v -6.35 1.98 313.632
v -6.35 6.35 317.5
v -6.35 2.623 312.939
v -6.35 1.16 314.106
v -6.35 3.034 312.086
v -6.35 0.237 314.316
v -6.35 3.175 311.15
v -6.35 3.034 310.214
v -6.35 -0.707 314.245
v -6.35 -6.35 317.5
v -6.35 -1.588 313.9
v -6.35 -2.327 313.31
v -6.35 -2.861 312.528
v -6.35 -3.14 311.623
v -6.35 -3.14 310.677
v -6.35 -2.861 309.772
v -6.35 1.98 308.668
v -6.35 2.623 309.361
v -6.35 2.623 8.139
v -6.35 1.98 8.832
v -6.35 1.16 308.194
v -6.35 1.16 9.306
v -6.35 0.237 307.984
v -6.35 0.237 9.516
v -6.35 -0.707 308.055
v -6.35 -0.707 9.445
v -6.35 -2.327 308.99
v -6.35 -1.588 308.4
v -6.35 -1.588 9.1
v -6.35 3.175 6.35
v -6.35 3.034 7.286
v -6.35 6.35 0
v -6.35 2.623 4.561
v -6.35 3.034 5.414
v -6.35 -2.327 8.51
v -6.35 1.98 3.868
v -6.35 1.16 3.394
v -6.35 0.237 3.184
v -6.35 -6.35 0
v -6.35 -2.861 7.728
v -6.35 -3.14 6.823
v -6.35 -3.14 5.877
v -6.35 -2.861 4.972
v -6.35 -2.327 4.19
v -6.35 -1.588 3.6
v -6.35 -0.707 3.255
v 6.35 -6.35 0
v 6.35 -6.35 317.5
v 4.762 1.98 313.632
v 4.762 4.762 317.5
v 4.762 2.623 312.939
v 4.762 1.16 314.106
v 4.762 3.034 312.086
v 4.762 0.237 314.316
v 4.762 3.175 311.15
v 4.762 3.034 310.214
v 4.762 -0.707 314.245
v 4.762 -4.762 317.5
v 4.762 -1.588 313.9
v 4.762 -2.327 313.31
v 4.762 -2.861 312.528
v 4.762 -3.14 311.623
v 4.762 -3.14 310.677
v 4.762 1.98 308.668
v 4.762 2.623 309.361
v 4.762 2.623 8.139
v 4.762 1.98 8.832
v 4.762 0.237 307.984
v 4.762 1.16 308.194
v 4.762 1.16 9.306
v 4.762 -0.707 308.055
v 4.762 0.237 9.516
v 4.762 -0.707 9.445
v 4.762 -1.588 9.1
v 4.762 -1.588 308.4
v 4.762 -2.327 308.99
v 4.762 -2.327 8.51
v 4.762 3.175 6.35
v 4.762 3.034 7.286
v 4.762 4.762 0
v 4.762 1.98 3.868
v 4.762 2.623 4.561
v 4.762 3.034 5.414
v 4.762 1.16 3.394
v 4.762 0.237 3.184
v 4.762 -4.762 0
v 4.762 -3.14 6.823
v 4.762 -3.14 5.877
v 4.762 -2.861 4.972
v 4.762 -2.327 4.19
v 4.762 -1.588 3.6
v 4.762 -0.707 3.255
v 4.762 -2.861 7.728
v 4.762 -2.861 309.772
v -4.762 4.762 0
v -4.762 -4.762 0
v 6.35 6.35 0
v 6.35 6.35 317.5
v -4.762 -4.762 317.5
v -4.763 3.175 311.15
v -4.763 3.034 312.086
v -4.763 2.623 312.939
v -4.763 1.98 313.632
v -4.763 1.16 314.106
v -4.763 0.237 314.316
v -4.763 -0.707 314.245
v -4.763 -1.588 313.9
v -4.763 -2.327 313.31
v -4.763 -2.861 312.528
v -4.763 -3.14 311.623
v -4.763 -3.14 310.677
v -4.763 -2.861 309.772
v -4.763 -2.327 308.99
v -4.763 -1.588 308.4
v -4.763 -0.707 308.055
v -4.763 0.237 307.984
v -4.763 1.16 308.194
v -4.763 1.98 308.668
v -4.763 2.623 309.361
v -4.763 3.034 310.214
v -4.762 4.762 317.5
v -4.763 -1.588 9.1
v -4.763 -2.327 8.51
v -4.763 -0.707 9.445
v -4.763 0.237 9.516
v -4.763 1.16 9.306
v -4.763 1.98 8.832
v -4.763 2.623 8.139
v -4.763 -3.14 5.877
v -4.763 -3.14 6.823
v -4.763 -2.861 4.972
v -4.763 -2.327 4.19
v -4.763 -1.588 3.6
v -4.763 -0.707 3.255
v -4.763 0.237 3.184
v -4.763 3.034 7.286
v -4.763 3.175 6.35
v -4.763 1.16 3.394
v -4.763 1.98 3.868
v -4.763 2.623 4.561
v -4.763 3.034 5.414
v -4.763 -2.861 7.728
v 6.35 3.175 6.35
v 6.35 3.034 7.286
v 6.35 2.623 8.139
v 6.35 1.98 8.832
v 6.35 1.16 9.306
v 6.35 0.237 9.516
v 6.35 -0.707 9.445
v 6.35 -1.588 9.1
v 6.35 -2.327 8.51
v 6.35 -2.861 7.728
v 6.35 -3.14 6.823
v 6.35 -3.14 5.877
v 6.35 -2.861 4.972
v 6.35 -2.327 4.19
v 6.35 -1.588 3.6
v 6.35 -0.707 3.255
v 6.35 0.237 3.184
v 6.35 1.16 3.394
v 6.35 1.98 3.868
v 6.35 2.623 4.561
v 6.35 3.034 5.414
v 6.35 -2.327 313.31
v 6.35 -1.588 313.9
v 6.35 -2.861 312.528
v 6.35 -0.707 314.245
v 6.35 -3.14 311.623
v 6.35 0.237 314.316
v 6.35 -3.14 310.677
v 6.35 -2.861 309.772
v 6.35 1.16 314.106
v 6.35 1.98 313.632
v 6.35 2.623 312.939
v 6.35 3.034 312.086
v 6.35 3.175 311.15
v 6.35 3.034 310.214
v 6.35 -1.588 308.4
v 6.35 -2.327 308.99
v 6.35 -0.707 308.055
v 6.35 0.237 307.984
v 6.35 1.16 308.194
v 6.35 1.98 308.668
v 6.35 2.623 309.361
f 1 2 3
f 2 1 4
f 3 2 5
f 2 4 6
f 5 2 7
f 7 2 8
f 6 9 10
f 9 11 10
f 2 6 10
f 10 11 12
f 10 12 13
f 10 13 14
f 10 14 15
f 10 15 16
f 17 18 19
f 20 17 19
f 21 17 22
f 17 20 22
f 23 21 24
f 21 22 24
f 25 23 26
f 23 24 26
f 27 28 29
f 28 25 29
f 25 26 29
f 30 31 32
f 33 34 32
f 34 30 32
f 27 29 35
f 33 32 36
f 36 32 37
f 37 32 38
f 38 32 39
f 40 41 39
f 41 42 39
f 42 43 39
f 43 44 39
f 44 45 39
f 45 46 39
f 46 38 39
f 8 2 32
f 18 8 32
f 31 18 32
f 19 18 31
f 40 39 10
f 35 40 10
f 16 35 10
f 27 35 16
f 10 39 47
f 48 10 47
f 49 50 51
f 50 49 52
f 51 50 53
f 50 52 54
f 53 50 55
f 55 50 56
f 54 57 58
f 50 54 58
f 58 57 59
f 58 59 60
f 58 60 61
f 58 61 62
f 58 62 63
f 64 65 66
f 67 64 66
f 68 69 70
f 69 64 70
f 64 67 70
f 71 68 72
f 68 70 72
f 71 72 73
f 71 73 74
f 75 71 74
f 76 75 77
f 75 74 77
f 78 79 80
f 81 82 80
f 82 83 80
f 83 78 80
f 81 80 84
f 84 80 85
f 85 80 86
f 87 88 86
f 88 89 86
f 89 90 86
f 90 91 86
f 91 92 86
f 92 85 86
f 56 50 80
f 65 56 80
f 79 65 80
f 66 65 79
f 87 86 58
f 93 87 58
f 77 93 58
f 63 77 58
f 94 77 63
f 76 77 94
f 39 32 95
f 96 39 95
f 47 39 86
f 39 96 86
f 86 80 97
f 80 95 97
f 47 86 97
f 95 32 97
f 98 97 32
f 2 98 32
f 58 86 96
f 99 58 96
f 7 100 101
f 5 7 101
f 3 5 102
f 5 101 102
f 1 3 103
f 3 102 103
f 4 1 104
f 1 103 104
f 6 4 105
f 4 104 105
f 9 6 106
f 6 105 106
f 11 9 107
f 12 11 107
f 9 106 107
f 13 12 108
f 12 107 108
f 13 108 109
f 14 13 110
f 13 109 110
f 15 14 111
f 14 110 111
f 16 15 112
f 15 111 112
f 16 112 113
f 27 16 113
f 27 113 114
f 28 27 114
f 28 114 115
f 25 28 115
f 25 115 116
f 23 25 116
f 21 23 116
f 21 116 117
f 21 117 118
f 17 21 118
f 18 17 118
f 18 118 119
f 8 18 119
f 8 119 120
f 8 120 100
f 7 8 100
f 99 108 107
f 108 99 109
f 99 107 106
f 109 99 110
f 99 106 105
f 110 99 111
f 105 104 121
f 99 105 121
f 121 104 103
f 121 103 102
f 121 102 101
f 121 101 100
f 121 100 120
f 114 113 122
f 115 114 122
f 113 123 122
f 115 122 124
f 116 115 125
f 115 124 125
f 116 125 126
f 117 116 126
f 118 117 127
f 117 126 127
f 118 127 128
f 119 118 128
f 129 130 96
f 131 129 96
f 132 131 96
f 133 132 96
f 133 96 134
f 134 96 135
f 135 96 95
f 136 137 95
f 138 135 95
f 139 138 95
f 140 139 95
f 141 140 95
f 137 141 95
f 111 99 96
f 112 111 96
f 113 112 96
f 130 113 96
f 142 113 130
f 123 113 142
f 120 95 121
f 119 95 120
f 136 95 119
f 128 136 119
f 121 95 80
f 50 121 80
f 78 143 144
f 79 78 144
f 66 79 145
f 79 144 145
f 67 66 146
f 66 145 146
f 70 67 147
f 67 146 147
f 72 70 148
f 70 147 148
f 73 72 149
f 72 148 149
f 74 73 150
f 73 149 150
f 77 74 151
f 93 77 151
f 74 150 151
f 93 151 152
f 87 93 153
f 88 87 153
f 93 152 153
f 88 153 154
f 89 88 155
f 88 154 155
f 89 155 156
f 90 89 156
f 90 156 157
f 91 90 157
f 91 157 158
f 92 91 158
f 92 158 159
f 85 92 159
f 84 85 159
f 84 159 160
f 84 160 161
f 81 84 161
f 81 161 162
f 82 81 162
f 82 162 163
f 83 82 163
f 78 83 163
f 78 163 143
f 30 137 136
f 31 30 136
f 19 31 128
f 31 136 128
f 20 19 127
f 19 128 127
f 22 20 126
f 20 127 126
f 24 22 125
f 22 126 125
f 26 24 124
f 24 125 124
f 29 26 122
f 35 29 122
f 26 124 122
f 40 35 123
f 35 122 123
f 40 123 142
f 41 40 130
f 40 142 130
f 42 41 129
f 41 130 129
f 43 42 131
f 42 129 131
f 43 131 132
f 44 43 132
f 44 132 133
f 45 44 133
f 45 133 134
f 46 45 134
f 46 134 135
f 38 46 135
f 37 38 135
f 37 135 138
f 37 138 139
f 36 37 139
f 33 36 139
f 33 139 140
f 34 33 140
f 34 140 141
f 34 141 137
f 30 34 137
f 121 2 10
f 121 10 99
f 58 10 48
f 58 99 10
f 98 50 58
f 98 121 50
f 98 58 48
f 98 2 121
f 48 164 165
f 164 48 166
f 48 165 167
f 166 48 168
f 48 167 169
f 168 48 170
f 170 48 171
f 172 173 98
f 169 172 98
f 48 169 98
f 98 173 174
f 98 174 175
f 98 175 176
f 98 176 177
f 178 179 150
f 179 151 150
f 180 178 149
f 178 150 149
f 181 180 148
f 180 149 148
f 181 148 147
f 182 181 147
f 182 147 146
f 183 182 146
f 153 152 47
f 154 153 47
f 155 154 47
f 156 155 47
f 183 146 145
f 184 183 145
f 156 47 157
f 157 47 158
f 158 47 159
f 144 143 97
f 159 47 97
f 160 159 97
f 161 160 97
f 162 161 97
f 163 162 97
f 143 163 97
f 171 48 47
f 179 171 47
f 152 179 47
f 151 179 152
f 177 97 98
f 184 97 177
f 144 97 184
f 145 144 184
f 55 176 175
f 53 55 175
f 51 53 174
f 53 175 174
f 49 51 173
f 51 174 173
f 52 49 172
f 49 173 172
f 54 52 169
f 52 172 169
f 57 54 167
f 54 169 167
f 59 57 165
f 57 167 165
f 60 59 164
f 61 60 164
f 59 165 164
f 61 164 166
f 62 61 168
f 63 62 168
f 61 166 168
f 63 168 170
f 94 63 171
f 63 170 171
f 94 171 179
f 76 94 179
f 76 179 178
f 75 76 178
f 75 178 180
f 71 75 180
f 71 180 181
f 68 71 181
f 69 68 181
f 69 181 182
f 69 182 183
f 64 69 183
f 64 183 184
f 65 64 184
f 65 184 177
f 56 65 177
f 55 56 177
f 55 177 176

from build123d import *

# Parameters (mm, degrees)
F1_DEPTH = 317.5
F2_R     = 3.175
F3_DEPTH = 12.701


with BuildPart() as f1:
    # F0 (on Top) → F1 (new body)
    with BuildSketch(Plane.XY):
        Polygon((0, 4.7625), (4.7625, 4.7625), (4.7625, 0), (6.35, 0), (6.35, 6.35), (0, 6.35), align=None)
        Polygon((-4.7625, 4.7625), (0, 4.7625), (0, 6.35), (-6.35, 6.35), (-6.35, -6.35), (6.35, -6.35), (6.35, 0), (4.7625, 0), (4.7625, -4.7625), (-4.7625, -4.7625), align=None)
    extrude(amount=F1_DEPTH)

    # F2 (on face) → F3 (cut, through all)
    with BuildSketch(Plane.YZ.offset(6.35)):
        with Locations((0, 6.35)):
            Circle(F2_R)
        with Locations((0, 311.15)):
            Circle(F2_R)
    extrude(amount=-F3_DEPTH, mode=Mode.SUBTRACT)


solid = f1.part
